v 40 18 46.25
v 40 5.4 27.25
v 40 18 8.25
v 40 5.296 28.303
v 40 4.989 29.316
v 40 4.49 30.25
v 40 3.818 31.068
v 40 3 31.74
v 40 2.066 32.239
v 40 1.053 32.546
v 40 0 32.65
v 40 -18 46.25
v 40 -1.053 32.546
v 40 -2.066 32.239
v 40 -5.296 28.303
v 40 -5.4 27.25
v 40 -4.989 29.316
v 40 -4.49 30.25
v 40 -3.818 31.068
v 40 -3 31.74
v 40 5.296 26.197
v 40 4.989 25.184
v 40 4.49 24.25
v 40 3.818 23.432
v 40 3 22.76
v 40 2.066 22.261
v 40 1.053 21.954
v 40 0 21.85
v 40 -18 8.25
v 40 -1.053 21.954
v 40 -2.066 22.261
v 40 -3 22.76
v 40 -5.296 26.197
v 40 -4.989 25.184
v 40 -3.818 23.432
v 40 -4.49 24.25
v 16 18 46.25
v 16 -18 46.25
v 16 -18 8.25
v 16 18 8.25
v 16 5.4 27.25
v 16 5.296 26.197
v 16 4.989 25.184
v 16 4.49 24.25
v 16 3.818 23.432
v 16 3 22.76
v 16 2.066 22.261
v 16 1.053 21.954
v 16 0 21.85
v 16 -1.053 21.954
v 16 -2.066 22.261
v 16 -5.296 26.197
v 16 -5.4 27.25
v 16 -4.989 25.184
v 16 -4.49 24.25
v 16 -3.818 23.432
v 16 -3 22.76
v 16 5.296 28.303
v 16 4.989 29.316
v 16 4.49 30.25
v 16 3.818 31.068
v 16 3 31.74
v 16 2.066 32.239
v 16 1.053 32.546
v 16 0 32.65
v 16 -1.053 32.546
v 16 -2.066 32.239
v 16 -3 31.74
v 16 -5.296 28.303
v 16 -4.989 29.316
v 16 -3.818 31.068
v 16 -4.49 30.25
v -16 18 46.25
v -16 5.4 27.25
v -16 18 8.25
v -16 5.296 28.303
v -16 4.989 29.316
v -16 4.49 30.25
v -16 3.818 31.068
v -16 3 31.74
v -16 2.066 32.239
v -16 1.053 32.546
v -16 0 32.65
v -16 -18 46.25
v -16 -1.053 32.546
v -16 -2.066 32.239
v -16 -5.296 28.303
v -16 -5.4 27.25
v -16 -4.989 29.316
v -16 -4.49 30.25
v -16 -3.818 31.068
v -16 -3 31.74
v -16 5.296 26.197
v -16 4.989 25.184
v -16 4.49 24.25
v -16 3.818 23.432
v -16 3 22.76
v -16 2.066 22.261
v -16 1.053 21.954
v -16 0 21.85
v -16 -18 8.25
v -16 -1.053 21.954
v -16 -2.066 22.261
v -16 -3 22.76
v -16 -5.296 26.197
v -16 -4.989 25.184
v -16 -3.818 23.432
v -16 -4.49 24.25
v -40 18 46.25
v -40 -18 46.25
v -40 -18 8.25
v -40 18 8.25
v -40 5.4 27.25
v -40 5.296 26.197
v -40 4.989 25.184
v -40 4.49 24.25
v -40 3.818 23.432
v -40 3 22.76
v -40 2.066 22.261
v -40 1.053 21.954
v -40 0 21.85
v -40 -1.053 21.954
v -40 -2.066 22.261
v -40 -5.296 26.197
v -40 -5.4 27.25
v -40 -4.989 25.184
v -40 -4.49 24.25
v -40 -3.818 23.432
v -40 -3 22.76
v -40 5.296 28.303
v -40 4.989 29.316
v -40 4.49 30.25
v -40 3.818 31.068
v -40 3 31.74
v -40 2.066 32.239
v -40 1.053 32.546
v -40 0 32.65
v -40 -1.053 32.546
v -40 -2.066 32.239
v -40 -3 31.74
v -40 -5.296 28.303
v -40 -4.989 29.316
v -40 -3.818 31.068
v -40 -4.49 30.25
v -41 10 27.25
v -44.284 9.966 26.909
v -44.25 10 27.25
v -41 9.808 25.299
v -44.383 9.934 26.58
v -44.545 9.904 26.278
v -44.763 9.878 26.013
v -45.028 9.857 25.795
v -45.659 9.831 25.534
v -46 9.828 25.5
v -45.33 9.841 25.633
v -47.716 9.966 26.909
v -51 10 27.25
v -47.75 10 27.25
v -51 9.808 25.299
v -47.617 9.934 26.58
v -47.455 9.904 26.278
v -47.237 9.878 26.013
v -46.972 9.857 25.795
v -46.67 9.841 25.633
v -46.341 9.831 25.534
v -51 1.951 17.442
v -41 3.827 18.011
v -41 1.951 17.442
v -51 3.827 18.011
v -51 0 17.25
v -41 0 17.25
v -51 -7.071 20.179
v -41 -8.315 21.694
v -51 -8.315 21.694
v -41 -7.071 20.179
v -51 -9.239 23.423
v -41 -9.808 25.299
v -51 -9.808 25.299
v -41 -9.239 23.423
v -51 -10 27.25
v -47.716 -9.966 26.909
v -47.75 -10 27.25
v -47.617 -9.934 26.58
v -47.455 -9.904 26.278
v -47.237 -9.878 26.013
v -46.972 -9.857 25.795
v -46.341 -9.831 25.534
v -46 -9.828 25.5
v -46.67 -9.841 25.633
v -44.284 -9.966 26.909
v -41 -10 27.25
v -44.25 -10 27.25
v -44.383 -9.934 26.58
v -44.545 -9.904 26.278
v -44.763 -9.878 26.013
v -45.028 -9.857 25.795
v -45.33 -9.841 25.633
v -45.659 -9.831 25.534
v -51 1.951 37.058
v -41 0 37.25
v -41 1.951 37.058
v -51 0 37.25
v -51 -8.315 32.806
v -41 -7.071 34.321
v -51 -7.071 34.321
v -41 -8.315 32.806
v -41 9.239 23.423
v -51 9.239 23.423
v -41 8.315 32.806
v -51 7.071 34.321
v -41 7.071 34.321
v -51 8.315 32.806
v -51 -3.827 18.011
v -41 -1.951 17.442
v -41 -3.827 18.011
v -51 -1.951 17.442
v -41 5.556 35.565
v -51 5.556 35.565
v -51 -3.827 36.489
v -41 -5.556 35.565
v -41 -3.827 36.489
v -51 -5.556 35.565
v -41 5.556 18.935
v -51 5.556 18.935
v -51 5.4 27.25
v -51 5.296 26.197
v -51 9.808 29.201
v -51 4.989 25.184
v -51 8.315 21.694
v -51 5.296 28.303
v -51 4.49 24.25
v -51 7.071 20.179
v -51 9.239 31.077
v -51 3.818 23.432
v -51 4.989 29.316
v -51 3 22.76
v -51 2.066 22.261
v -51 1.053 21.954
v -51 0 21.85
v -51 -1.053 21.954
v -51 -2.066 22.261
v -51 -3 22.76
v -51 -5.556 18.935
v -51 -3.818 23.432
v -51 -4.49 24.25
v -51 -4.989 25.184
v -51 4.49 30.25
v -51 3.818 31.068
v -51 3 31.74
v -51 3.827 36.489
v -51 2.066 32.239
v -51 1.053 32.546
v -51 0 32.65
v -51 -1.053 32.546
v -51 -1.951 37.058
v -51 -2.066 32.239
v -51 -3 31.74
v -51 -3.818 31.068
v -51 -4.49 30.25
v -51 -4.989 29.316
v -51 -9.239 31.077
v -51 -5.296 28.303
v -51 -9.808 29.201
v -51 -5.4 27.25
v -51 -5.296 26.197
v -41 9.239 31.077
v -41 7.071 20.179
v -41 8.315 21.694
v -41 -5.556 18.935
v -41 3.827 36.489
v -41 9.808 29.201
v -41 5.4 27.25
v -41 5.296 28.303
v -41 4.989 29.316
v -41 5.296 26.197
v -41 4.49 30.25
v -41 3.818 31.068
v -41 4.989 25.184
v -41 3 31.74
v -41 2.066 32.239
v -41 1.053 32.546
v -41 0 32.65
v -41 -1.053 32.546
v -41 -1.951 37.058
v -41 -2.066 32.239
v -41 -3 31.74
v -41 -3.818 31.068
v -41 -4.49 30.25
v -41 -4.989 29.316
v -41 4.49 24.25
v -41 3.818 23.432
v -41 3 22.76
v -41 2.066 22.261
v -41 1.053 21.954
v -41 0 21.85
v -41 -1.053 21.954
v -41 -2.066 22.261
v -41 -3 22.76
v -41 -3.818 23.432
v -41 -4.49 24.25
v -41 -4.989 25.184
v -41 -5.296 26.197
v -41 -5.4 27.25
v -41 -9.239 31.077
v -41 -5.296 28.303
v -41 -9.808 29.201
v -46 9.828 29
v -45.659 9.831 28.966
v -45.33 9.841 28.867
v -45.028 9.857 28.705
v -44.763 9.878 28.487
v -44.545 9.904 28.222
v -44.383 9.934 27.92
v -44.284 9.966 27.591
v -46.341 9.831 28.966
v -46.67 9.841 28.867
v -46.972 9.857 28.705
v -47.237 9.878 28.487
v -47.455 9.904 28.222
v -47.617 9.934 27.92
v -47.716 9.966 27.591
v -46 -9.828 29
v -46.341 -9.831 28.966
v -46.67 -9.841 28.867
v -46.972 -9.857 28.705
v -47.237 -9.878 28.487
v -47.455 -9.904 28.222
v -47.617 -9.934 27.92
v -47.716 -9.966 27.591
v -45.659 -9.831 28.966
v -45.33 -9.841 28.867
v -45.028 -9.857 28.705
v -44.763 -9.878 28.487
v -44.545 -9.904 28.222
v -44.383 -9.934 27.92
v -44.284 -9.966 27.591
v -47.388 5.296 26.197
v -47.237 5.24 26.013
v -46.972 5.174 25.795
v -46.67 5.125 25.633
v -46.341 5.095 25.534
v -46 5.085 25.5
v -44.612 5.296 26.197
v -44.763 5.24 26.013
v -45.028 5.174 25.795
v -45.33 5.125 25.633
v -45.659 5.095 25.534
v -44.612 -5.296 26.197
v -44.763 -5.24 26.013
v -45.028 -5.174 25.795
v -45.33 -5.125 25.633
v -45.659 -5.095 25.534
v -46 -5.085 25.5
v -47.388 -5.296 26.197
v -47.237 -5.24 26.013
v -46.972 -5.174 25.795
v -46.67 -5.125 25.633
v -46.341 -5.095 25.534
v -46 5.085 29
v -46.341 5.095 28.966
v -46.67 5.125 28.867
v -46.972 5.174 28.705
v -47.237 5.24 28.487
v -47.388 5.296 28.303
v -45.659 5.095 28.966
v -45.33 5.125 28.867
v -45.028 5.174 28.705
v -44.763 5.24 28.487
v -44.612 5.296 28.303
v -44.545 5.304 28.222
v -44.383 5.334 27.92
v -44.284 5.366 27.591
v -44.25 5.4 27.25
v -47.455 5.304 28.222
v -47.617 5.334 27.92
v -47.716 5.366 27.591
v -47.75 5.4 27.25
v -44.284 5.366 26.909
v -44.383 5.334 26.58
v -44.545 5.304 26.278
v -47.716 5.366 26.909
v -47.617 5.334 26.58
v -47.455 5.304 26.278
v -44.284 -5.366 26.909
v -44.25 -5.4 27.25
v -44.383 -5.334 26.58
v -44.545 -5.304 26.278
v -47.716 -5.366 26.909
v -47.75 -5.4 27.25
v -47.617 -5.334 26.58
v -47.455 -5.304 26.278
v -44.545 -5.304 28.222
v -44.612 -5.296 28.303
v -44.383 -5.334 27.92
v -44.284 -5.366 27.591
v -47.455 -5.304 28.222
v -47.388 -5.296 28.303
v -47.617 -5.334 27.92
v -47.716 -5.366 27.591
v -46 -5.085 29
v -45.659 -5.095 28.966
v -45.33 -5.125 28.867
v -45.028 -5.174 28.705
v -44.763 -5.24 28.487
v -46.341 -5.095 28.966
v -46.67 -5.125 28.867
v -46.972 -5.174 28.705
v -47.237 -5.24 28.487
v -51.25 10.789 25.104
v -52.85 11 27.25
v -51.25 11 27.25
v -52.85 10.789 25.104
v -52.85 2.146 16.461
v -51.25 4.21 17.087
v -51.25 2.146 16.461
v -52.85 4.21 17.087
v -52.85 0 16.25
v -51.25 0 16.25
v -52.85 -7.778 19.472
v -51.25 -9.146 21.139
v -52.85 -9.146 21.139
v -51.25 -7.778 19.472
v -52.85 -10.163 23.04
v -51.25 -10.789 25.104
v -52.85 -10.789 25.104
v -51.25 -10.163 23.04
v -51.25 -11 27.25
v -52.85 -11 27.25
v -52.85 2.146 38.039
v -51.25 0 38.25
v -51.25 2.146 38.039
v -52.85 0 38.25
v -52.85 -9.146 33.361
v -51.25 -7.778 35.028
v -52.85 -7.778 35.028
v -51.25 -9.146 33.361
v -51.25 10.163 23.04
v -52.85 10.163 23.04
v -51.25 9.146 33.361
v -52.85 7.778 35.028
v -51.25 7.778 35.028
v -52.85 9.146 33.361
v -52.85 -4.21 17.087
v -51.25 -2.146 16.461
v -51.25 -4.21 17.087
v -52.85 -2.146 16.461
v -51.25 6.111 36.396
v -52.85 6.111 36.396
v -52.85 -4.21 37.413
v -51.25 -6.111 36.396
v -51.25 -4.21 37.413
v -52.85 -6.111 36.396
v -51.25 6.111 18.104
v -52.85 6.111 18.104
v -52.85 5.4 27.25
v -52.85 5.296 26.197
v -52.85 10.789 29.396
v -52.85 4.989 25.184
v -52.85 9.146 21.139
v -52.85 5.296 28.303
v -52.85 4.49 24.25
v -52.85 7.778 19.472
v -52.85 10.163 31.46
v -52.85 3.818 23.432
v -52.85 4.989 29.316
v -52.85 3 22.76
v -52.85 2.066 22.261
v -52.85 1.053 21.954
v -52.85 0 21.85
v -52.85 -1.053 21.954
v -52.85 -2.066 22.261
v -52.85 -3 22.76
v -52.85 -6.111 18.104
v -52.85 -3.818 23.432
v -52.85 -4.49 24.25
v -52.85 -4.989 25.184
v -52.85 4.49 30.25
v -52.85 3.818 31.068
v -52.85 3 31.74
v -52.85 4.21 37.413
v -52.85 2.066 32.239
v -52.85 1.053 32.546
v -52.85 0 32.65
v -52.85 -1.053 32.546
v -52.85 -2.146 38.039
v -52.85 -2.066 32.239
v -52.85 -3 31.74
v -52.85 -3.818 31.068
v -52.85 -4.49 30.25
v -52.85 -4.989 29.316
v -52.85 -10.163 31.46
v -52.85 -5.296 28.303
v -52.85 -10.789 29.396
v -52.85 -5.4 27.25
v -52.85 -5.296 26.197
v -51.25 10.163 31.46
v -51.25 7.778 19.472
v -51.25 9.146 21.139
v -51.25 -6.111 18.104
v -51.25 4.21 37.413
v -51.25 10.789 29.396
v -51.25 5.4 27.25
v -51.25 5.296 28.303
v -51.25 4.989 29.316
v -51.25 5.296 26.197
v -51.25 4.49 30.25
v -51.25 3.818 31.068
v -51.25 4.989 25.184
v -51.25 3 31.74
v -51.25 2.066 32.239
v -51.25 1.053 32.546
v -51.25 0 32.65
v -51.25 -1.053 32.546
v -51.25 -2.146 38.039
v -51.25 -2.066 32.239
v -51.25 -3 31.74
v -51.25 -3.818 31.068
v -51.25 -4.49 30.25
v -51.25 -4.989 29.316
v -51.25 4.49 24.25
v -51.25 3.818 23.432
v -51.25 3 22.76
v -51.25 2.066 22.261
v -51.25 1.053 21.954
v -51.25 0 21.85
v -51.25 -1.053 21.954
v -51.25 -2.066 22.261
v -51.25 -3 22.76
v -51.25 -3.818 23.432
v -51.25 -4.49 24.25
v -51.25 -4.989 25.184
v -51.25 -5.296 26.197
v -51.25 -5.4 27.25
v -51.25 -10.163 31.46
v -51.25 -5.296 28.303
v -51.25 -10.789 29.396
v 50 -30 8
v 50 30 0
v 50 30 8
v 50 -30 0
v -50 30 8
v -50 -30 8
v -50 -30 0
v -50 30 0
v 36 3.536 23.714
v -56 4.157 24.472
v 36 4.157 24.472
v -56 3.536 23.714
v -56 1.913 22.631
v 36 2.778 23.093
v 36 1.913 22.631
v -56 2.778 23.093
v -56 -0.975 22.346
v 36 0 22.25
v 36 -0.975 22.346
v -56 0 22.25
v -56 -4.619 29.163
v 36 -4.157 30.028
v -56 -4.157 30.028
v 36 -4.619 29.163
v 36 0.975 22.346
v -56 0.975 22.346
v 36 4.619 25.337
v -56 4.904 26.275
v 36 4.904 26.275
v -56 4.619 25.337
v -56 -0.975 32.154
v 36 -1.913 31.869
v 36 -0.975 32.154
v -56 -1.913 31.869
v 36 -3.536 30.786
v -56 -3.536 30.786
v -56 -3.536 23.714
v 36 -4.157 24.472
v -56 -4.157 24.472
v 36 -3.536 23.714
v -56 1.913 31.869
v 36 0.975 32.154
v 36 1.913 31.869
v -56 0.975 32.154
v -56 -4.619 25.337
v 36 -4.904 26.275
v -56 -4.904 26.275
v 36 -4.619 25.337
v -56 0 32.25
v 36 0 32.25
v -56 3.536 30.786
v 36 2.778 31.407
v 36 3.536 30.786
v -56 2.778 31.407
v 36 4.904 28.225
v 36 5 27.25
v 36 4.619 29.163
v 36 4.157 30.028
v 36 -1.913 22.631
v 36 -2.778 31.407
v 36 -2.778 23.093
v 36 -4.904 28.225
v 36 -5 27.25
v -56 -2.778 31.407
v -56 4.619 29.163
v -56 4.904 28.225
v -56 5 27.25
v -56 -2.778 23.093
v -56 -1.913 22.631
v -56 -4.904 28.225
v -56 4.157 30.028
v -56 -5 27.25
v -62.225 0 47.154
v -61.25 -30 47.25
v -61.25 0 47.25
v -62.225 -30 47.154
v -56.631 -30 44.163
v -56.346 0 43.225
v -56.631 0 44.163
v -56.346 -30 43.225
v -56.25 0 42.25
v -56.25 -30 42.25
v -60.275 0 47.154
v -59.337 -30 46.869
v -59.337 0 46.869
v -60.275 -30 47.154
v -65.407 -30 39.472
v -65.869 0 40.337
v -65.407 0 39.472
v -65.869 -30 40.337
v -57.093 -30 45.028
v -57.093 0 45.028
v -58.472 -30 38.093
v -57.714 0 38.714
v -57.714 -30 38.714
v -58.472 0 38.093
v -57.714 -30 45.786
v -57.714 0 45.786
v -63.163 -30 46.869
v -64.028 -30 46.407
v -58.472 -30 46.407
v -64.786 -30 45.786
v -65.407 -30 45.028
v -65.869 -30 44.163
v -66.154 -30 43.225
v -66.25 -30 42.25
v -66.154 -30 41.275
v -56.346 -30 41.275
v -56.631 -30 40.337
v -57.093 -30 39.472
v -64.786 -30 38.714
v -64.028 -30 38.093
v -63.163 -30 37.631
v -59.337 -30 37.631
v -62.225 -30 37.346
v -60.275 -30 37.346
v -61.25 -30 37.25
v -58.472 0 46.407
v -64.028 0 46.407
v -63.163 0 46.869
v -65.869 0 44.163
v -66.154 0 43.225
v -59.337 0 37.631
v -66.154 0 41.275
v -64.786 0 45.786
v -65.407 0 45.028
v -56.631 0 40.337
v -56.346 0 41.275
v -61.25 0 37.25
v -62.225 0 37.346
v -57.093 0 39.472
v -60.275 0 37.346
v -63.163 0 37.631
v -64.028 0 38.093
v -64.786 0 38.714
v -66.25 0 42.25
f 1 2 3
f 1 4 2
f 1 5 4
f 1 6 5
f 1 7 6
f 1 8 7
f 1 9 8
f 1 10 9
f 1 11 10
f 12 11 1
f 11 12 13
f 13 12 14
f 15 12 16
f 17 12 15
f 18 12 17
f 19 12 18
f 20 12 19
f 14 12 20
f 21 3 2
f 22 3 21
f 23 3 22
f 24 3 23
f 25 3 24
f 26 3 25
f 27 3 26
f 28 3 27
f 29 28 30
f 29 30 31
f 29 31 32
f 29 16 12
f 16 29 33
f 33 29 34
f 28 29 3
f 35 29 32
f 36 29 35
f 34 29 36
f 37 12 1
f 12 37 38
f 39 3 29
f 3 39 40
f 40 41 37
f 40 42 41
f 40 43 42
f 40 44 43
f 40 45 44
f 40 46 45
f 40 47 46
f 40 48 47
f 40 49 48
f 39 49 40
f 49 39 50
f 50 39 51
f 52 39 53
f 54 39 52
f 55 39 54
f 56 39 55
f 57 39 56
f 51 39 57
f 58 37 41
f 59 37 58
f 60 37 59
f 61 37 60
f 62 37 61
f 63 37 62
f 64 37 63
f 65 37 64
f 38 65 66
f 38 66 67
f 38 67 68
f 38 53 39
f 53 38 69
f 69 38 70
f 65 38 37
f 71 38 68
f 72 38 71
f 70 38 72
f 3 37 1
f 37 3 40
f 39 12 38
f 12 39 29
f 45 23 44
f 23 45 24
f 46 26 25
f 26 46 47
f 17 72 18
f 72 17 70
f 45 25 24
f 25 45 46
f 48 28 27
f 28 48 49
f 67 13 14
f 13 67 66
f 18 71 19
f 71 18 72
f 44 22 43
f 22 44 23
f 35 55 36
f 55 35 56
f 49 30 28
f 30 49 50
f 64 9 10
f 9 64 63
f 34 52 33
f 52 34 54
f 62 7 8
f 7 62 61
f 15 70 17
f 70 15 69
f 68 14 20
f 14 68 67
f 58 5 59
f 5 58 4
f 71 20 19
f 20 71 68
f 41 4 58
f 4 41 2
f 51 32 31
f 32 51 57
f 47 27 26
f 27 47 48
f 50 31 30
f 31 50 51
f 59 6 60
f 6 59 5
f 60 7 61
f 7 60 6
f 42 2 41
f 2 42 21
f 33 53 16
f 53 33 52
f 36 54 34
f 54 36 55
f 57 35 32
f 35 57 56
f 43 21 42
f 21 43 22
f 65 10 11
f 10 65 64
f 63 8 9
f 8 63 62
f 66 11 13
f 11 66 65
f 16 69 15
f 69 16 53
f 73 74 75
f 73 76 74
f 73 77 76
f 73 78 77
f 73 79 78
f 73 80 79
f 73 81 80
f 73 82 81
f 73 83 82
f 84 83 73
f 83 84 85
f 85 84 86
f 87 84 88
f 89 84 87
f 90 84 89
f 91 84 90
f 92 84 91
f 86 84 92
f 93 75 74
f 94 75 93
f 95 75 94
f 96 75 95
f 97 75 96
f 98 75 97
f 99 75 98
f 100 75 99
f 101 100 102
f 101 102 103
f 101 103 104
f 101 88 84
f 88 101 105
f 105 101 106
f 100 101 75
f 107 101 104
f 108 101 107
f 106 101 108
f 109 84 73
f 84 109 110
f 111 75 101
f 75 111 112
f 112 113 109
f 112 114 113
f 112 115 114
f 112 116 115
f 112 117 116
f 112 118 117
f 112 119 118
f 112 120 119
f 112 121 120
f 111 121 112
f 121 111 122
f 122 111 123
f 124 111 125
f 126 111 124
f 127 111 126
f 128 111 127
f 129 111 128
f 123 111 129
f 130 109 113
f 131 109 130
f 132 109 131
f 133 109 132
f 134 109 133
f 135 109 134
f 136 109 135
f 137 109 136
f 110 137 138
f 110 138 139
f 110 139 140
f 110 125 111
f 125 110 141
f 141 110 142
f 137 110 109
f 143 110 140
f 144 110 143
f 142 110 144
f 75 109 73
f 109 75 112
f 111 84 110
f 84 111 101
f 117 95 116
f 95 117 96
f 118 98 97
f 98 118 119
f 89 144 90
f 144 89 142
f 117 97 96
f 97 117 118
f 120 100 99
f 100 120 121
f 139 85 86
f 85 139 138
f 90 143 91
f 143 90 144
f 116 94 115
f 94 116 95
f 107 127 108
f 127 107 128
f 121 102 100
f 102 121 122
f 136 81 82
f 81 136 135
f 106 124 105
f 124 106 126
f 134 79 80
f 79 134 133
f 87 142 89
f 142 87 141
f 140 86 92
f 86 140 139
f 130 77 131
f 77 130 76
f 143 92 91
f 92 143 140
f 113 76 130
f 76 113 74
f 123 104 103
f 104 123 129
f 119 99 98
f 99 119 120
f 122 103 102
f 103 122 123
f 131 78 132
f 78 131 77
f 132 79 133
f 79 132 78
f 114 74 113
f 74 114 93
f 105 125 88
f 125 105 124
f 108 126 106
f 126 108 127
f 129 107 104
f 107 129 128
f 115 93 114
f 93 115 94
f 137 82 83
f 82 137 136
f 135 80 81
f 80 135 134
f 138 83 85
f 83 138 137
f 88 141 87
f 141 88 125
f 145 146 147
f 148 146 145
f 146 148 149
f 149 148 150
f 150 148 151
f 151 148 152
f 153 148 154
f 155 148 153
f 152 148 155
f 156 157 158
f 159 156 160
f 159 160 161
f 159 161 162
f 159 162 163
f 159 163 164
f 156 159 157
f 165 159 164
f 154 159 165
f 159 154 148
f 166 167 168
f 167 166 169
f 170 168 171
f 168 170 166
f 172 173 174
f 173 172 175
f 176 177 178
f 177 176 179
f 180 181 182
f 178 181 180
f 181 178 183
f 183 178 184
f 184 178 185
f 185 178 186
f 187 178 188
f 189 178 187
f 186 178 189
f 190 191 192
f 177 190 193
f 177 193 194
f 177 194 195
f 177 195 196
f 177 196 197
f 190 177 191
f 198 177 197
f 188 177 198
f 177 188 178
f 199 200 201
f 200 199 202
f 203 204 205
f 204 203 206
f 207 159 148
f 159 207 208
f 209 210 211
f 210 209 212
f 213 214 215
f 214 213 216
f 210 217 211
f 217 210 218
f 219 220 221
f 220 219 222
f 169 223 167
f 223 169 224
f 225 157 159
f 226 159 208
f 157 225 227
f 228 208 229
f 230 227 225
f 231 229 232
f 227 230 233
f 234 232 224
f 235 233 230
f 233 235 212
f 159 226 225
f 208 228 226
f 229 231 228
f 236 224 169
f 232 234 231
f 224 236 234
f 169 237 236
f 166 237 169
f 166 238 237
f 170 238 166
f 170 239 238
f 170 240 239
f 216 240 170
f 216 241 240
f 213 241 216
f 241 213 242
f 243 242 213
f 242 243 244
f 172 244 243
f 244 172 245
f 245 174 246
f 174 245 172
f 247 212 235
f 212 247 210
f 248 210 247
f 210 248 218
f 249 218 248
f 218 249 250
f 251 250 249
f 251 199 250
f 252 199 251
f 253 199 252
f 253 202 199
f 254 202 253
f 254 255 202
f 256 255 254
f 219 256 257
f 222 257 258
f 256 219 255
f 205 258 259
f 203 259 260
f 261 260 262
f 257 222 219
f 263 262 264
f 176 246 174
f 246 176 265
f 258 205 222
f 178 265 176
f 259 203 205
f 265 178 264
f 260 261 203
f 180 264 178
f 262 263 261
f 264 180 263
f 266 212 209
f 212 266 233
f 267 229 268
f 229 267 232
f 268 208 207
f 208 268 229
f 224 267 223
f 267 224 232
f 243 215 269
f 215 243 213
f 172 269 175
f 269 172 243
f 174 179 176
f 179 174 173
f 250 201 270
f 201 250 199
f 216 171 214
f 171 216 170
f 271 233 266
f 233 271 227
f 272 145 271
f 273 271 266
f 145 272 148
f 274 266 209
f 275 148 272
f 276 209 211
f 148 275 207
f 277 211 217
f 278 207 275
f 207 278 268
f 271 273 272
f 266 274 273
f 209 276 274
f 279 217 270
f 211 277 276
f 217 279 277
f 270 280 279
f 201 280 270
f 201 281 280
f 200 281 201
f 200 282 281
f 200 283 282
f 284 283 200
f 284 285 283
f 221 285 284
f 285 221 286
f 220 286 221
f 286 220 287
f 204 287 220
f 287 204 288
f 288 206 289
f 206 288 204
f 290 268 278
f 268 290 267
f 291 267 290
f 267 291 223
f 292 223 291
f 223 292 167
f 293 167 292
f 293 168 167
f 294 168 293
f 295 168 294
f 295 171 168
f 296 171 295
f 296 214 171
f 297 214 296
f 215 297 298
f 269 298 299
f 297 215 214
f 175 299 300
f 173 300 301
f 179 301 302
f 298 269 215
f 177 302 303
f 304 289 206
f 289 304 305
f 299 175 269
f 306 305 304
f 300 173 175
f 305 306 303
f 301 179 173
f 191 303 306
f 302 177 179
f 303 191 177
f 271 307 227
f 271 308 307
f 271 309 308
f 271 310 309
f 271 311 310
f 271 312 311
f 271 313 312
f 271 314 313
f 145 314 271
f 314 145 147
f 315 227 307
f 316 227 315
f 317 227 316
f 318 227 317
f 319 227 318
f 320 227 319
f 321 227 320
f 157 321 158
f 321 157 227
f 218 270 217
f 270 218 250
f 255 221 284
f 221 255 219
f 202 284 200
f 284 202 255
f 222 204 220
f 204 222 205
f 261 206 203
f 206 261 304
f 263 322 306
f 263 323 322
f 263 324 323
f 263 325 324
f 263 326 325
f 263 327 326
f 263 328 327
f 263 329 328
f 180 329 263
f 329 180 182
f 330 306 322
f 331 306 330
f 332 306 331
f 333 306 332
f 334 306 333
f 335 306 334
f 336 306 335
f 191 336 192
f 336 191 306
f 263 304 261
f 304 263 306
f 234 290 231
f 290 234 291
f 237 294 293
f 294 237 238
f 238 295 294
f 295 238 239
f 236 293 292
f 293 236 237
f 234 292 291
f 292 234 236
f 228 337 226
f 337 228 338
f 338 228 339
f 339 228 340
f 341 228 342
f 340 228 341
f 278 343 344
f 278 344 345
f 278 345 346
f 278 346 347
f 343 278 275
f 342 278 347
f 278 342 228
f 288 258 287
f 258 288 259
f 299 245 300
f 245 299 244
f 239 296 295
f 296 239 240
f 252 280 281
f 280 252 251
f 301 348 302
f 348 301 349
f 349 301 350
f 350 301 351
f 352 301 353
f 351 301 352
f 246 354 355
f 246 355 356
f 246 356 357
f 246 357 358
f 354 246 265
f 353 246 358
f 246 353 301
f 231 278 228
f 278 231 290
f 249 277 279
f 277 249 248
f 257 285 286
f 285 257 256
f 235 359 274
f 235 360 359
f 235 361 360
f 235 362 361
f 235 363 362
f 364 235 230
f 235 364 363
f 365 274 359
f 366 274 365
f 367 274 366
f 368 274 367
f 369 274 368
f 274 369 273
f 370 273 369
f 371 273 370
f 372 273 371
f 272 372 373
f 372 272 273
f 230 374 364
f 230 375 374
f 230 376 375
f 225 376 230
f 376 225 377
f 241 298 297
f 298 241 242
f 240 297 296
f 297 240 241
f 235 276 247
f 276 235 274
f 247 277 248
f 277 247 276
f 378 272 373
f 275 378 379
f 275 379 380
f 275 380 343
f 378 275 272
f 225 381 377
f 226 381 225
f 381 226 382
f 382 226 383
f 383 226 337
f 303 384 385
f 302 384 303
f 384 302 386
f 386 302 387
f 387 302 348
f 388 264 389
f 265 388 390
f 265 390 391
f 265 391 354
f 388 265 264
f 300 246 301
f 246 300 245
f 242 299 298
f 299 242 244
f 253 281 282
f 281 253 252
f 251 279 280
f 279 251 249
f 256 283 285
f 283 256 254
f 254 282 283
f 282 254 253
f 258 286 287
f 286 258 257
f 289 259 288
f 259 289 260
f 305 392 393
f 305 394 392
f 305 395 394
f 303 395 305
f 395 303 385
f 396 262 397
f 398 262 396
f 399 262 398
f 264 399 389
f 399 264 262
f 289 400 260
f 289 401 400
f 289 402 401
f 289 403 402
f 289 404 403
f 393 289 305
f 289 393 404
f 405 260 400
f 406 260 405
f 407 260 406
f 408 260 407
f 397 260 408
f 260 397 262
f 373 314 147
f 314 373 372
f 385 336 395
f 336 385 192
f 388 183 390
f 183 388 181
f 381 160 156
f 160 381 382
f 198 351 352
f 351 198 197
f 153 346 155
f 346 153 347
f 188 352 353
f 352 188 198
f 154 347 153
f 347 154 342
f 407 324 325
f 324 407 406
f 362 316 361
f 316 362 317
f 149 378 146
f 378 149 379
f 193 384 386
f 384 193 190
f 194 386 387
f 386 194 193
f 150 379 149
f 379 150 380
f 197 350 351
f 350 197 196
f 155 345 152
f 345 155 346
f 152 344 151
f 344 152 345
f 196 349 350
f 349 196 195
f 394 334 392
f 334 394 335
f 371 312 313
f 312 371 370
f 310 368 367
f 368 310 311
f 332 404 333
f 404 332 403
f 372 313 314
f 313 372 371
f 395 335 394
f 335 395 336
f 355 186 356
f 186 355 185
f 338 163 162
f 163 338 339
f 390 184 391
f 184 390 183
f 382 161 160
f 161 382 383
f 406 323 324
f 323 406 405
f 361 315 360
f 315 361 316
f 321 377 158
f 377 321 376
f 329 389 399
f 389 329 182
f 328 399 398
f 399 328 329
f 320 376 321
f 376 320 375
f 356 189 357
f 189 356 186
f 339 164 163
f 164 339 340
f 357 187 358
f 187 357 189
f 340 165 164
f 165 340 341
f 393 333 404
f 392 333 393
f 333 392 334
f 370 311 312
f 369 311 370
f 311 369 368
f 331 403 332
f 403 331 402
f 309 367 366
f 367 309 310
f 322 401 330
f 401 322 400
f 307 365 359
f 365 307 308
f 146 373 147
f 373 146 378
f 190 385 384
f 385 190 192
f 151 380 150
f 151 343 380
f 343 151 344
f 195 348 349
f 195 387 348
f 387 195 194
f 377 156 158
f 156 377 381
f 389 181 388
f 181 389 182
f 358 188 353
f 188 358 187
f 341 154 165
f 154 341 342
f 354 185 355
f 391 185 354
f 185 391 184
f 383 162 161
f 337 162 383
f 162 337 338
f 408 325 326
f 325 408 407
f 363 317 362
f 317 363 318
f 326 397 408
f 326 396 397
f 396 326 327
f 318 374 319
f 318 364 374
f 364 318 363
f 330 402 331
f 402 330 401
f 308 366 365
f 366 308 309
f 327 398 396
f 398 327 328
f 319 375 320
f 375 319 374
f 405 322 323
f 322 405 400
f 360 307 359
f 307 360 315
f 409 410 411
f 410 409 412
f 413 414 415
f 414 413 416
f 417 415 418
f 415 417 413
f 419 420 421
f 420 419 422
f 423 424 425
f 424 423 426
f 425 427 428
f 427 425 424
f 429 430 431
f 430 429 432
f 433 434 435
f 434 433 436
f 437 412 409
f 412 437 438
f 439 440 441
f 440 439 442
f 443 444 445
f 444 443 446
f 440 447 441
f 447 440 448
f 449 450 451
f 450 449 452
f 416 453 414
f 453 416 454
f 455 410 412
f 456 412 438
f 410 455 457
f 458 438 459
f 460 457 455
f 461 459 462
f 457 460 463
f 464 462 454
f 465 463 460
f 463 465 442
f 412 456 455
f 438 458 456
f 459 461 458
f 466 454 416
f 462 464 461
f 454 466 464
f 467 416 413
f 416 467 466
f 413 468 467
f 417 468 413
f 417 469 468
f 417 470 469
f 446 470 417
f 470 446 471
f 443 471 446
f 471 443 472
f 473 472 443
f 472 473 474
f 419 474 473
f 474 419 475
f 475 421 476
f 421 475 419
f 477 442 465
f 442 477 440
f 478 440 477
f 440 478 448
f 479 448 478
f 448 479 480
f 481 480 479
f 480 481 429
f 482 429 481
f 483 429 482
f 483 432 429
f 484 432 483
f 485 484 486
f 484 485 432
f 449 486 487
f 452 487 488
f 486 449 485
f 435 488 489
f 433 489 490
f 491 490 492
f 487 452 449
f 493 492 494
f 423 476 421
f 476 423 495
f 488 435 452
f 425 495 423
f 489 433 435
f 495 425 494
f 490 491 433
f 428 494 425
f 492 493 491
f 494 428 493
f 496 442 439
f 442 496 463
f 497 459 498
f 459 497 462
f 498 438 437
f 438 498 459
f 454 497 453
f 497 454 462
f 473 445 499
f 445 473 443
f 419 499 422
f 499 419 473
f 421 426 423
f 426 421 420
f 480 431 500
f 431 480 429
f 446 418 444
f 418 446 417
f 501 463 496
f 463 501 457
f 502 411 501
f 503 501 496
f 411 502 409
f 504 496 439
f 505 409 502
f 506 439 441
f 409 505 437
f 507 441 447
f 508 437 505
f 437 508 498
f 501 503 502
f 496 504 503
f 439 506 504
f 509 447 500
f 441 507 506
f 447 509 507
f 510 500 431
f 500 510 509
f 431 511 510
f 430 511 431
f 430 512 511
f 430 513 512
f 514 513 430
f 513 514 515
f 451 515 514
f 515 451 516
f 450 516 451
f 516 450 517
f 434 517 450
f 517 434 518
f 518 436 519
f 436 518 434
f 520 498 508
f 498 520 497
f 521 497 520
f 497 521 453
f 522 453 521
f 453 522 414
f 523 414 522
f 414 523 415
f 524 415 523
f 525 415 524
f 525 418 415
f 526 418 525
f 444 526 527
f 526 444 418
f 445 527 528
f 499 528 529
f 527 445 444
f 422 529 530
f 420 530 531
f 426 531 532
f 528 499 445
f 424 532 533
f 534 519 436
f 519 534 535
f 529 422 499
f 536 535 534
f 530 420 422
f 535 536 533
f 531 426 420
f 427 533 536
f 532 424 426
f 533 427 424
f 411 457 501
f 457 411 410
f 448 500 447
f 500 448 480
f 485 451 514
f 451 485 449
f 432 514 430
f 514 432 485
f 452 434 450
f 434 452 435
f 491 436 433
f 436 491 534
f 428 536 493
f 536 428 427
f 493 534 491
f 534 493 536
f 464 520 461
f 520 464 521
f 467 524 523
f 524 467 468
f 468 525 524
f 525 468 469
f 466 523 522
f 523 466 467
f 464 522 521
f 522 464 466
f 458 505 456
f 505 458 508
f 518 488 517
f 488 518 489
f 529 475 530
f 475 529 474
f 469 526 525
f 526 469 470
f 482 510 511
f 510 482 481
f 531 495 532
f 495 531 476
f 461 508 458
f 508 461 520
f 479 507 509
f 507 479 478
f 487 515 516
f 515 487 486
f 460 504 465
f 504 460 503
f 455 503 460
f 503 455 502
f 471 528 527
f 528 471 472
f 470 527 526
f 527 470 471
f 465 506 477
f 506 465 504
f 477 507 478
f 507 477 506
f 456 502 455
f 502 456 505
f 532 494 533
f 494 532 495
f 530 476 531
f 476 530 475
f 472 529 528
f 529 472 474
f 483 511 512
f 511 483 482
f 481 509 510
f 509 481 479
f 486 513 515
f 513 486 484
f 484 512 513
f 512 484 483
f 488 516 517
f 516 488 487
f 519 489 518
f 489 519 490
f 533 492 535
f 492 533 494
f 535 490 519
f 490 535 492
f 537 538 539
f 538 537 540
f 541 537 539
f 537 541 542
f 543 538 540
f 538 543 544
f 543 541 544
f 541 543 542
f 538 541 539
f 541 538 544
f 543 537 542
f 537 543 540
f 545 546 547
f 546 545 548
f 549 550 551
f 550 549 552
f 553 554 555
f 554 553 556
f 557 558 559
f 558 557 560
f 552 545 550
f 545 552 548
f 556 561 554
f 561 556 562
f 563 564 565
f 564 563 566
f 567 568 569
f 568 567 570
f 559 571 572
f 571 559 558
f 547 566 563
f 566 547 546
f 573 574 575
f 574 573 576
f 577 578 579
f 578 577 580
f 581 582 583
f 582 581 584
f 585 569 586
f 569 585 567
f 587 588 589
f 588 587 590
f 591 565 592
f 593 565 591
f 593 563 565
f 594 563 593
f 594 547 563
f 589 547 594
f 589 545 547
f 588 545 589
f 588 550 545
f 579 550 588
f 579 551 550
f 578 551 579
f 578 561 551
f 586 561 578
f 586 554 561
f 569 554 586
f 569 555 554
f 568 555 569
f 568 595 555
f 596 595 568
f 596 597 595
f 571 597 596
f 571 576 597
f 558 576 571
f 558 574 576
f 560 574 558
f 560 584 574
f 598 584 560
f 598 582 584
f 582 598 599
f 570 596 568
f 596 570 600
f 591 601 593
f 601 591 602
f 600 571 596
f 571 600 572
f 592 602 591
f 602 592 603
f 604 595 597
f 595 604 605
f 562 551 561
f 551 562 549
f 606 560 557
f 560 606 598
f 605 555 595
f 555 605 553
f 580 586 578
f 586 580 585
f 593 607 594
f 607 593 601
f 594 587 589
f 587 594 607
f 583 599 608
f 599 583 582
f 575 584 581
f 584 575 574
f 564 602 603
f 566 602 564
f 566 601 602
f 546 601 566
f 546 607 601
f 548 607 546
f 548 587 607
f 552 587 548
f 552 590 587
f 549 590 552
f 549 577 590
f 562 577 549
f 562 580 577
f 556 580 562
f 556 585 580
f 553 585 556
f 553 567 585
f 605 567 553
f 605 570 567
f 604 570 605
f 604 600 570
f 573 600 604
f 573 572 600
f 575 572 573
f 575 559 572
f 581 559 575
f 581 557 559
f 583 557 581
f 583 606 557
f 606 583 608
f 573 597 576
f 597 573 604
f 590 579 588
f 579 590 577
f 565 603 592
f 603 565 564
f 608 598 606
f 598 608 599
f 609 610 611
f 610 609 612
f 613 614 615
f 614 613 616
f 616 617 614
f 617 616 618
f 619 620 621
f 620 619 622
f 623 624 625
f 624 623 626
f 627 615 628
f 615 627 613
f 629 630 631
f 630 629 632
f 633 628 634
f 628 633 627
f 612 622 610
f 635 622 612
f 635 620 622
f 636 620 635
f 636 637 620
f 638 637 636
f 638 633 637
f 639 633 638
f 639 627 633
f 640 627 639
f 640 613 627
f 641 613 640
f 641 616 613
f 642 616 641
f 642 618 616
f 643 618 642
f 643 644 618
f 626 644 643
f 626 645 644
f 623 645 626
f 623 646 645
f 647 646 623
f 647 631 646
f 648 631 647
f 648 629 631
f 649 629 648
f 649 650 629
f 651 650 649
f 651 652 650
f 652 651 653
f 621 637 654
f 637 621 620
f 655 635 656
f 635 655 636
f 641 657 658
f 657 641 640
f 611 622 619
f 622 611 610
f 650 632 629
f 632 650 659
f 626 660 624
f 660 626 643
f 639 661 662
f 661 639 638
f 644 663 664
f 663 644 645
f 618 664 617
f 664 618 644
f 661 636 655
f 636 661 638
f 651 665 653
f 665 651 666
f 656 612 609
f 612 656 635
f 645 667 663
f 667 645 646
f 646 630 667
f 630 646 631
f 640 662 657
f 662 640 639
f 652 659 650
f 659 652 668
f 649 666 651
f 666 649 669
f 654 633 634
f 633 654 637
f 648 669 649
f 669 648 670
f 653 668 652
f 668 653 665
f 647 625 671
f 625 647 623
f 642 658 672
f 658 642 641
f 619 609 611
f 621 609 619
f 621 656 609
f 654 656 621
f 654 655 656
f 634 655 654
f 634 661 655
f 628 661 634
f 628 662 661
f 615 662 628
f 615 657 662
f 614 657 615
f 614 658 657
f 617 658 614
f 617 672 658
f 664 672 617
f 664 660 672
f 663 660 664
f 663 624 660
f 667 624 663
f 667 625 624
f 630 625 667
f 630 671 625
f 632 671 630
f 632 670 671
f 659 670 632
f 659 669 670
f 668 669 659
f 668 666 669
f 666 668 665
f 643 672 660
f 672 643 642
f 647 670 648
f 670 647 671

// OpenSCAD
$fn = 32;

// ------------------------------------------------------------------------
// Machine vise: screw d10, jaws 24 x 38 mm
// Every part is its own module, assembly() places every instance.
// ------------------------------------------------------------------------

// --- part 1 ---
module vise_bed() {
  difference() {
    translate([-50, -30, 0]) cube([100, 60, 8]);
  }
}

// --- part 2 ---
module vise_jaw() {
  difference() {
    translate([-12, -18, 0]) cube([24, 36, 38]);
    translate([0, 0, 19]) rotate([0, 90, 0]) cylinder(h = 26, d = 10.8, center = true);
  }
}

// --- part 3 ---
module vise_screw() {
  translate([0, 0, -46]) cylinder(h = 92, d = 10);
}

// --- part 4 ---
module screw_collar() {
  difference() {
    cylinder(h = 10, d = 20);
    translate([0, 0, -1]) cylinder(h = 12, d = 10.8);
    translate([0, 0, 5]) rotate([90, 0, 0]) cylinder(h = 22, d = 3.5, center = true);
  }
}

// --- part 5 ---
module screw_washer() {
  difference() {
      translate([0, 0, 0]) cylinder(h = 1.6, d = 22);
      translate([0, 0, -1]) cylinder(h = 3.6, d = 10.8);
    }
}

// --- part 6 ---
module vise_handle() {
  cylinder(h = 30, d = 10);
}

// --- assembly ---
module assembly() {
  color([0.80, 0.24, 0.20]) translate([0, 0, 0]) rotate([0, 0, 0]) vise_bed();
  color([0.20, 0.45, 0.75]) translate([28, 0, 8.25]) rotate([0, 0, 0]) vise_jaw();
  color([0.25, 0.62, 0.32]) translate([-28, 0, 8.25]) rotate([0, 0, 0]) vise_jaw();
  color([0.92, 0.70, 0.18]) translate([-10, 0, 27.25]) rotate([0, 90, 0]) vise_screw();
  color([0.58, 0.35, 0.70]) translate([-51, 0, 27.25]) rotate([0, 90, 0]) screw_collar();
  color([0.16, 0.66, 0.66]) translate([-52.85, 0, 27.25]) rotate([0, 90, 0]) screw_washer();
  color([0.85, 0.48, 0.18]) translate([-61.25, 0, 42.25]) rotate([90, 0, 0]) vise_handle();
}

assembly();
